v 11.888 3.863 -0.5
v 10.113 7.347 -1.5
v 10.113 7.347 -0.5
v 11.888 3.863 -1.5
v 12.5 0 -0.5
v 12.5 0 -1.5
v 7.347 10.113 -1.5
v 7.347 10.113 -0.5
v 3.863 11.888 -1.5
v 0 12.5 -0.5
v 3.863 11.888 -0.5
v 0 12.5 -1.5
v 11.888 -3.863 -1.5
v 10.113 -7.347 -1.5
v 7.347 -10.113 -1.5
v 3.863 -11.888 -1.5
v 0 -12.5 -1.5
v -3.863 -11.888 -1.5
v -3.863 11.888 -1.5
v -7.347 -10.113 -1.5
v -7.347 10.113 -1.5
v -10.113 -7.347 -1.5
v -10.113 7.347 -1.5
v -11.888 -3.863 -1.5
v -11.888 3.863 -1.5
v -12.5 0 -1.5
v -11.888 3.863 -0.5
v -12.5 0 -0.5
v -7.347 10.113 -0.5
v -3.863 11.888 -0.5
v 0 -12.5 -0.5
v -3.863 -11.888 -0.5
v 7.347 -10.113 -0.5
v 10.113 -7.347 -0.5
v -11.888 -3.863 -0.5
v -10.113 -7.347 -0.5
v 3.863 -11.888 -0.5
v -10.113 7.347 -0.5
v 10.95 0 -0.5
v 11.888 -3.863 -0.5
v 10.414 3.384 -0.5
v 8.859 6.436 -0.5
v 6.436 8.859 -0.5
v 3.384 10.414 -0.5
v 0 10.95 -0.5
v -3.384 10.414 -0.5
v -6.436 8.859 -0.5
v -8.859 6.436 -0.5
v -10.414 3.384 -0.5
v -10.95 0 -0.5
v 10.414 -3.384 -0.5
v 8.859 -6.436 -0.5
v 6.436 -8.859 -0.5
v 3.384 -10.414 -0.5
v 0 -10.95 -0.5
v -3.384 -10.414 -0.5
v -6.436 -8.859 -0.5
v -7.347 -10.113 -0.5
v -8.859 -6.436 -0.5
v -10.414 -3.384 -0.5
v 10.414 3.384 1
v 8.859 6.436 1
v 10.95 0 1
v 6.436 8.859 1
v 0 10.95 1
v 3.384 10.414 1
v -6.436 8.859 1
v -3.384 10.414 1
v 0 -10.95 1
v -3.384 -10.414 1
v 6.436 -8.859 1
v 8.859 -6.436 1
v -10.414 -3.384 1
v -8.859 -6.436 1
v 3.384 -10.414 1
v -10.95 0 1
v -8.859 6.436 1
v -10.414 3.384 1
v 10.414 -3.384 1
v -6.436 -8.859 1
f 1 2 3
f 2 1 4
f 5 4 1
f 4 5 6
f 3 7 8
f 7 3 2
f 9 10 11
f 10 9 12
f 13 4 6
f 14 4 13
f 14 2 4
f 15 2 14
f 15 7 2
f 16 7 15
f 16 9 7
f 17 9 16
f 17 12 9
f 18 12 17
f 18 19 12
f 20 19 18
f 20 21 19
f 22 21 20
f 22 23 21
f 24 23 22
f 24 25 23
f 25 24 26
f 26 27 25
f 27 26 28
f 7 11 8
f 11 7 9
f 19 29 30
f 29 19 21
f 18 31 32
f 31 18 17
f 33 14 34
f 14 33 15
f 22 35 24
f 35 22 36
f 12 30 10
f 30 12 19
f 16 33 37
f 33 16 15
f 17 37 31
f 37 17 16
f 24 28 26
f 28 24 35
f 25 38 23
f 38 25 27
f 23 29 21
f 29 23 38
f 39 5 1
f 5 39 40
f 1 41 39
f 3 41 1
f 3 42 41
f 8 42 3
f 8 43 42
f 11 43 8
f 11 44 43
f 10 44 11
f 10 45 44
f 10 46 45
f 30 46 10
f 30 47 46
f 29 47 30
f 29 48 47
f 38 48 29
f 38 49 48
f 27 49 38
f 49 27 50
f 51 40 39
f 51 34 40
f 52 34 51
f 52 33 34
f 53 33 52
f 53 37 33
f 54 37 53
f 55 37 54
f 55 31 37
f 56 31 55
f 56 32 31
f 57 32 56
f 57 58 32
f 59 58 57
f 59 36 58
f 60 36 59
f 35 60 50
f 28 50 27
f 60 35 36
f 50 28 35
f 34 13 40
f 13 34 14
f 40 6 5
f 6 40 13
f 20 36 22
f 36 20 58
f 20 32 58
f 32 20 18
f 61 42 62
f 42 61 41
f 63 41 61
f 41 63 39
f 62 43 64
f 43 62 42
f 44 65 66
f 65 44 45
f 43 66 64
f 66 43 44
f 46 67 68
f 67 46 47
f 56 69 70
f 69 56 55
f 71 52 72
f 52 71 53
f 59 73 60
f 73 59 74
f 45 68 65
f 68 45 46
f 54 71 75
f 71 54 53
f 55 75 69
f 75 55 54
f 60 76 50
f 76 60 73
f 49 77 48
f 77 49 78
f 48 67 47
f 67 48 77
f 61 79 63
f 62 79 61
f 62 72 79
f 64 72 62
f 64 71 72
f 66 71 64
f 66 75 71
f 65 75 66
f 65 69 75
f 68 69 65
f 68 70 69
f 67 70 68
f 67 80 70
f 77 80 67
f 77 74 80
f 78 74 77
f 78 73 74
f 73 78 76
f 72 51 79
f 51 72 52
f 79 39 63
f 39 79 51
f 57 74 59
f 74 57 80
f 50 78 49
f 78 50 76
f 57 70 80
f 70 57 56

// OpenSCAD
// file: global_variables.scad
/*
re written 3d models for the FlyPi. Making it easier to read
and to change. The main idea is simple, taking structures and variables
that are common between parts and making them into modules, 
library files. 


Created by A.M. Chagas 2017 CC BY 4.0
Derived from the original files created by T. Baden


global_variables  file has the variables that will be used 
by other parts
*/

tolerance = 0.1; // Global gap between all parts that need to slide

$fn=20;




//////////////////////////////////////////////////////////////////////////////


//variables related  to square_mount///////////////////////////////////////
//variables for the attachment where parts connect to mounting poles
posx = 18;
posy = 20;
posz = 5;
negx = 10+2*tolerance;
negy = 5+2*tolerance;
negz = posz+1;

screwd = 3.1;//2.95; // diameter of the screw used to fix the parts 

fitx_hole = 10;//x dimension of hole that will fit with the mounting poles
fity_hole = 5; //y dimension of hole that will fit with the mounting poles

fitx = 20; // x dimension of the material that will go around the mounting
          // holes
fity = 22; // y dimension of the material that will go around the mounting
          // holes
mink_dia=0; //sets the diameter of the cylinders used to round pieces up

part_border = 5; //how much larger in x and y  than the actual parts 
                  //being held the printed part is going to be
partx = 25;
party = 25;
offsety = (party+posy)/2+part_border-2;

partz  = 5; //how thick the part printed is going to be

///////raspberry pi///////////////////////////////////////////////////////////
rpiwidth = 56; // Dimensions of the RPi 2 (below also for RPi 2)

rpiholedisy = 49;
rpiholedisx = 58;
rpigrounddist = 4.2;
//////////////////////////////////////////////////////////////////////////

//////////////////CAMERA VARIABLES////////////////////////////////////
// RPi Camera Type
camx = 32.2+2*tolerance;//24 for "classic RPi Cam V1. i.e the one
                        //without the adjustable focus lens";
camy = 32.2+2*tolerance;//25 for "classic RPi Cam V1";



camxoffset = 2.50;// 2.5 for "classic RPi Cam";
cam_pcb_z = 2; // thickness of camera mount
C_Z2 = 5; // thickness of cmaera mount walls
C_ridge = 2; // width of ridge for camera mount
CamGroove_X = 12;
CamGroove_Y = 16.1;
CamGroove2_Y = 24;

MiniGrooveX = 15;

////////////////////////////////////////////////////////////////////////////




//peltier dimensions///////////////////////////////////////////////////////
peltierx = 40+1; // Size of the Peltier
peltiery = 40+1;
peltierz = 3; // Thickness of the Peltier
peltierborder = 12; // Extension in X dimension of base next to Peltier
peltierridge = 1.6; // below Peltier, width of ridge
peltiercable = 3; // thickness of Peltier cable slid
//////////////////////////////////////////////////////////////////////////////

//base///////////////////////////////////////////////////////////////////////
baseextension = 70;
basex=peltierx+2*peltierborder+partz+baseextension;
basey=rpiwidth+2*peltiercable;
basez=19;
stabid=24;

////////////////////////////////////////////////////////////////////



////////markerled////////////////////////////////////////////////////////
markerledd = 7; // diam of RGB LED hole in base
markerledz = 2; // depth beneath surface
markerx = 4; // Module A, viewhole size

///////////////////////////////////////////////////////////////////////////

///connection holes and stick dimensions////////////////////////////
conntubed=11;
conntubeh=16;
conntubed2=8.5;
stickx=10;
sticky=5;
stickz=18;
//18 short stick
//60 medium stick
//120 long stick

//ring
ring_de = 51; //external diameter of the ring
ring_di = 35; //internal diameter of the ring

////////////////////fluorescence tubes//////////////////////////

tubewall = 3;
tubed = 22;
tubeh = 30;
plugh=2;
// main file
include<global_variables.scad>




    union(){
    translate([0,0,-1]){
    cylinder(d=tubed+tubewall,h=1,center=true);
    }//translate
    cylinder(d=tubed-tolerance,h=plugh,center=true);
    }
